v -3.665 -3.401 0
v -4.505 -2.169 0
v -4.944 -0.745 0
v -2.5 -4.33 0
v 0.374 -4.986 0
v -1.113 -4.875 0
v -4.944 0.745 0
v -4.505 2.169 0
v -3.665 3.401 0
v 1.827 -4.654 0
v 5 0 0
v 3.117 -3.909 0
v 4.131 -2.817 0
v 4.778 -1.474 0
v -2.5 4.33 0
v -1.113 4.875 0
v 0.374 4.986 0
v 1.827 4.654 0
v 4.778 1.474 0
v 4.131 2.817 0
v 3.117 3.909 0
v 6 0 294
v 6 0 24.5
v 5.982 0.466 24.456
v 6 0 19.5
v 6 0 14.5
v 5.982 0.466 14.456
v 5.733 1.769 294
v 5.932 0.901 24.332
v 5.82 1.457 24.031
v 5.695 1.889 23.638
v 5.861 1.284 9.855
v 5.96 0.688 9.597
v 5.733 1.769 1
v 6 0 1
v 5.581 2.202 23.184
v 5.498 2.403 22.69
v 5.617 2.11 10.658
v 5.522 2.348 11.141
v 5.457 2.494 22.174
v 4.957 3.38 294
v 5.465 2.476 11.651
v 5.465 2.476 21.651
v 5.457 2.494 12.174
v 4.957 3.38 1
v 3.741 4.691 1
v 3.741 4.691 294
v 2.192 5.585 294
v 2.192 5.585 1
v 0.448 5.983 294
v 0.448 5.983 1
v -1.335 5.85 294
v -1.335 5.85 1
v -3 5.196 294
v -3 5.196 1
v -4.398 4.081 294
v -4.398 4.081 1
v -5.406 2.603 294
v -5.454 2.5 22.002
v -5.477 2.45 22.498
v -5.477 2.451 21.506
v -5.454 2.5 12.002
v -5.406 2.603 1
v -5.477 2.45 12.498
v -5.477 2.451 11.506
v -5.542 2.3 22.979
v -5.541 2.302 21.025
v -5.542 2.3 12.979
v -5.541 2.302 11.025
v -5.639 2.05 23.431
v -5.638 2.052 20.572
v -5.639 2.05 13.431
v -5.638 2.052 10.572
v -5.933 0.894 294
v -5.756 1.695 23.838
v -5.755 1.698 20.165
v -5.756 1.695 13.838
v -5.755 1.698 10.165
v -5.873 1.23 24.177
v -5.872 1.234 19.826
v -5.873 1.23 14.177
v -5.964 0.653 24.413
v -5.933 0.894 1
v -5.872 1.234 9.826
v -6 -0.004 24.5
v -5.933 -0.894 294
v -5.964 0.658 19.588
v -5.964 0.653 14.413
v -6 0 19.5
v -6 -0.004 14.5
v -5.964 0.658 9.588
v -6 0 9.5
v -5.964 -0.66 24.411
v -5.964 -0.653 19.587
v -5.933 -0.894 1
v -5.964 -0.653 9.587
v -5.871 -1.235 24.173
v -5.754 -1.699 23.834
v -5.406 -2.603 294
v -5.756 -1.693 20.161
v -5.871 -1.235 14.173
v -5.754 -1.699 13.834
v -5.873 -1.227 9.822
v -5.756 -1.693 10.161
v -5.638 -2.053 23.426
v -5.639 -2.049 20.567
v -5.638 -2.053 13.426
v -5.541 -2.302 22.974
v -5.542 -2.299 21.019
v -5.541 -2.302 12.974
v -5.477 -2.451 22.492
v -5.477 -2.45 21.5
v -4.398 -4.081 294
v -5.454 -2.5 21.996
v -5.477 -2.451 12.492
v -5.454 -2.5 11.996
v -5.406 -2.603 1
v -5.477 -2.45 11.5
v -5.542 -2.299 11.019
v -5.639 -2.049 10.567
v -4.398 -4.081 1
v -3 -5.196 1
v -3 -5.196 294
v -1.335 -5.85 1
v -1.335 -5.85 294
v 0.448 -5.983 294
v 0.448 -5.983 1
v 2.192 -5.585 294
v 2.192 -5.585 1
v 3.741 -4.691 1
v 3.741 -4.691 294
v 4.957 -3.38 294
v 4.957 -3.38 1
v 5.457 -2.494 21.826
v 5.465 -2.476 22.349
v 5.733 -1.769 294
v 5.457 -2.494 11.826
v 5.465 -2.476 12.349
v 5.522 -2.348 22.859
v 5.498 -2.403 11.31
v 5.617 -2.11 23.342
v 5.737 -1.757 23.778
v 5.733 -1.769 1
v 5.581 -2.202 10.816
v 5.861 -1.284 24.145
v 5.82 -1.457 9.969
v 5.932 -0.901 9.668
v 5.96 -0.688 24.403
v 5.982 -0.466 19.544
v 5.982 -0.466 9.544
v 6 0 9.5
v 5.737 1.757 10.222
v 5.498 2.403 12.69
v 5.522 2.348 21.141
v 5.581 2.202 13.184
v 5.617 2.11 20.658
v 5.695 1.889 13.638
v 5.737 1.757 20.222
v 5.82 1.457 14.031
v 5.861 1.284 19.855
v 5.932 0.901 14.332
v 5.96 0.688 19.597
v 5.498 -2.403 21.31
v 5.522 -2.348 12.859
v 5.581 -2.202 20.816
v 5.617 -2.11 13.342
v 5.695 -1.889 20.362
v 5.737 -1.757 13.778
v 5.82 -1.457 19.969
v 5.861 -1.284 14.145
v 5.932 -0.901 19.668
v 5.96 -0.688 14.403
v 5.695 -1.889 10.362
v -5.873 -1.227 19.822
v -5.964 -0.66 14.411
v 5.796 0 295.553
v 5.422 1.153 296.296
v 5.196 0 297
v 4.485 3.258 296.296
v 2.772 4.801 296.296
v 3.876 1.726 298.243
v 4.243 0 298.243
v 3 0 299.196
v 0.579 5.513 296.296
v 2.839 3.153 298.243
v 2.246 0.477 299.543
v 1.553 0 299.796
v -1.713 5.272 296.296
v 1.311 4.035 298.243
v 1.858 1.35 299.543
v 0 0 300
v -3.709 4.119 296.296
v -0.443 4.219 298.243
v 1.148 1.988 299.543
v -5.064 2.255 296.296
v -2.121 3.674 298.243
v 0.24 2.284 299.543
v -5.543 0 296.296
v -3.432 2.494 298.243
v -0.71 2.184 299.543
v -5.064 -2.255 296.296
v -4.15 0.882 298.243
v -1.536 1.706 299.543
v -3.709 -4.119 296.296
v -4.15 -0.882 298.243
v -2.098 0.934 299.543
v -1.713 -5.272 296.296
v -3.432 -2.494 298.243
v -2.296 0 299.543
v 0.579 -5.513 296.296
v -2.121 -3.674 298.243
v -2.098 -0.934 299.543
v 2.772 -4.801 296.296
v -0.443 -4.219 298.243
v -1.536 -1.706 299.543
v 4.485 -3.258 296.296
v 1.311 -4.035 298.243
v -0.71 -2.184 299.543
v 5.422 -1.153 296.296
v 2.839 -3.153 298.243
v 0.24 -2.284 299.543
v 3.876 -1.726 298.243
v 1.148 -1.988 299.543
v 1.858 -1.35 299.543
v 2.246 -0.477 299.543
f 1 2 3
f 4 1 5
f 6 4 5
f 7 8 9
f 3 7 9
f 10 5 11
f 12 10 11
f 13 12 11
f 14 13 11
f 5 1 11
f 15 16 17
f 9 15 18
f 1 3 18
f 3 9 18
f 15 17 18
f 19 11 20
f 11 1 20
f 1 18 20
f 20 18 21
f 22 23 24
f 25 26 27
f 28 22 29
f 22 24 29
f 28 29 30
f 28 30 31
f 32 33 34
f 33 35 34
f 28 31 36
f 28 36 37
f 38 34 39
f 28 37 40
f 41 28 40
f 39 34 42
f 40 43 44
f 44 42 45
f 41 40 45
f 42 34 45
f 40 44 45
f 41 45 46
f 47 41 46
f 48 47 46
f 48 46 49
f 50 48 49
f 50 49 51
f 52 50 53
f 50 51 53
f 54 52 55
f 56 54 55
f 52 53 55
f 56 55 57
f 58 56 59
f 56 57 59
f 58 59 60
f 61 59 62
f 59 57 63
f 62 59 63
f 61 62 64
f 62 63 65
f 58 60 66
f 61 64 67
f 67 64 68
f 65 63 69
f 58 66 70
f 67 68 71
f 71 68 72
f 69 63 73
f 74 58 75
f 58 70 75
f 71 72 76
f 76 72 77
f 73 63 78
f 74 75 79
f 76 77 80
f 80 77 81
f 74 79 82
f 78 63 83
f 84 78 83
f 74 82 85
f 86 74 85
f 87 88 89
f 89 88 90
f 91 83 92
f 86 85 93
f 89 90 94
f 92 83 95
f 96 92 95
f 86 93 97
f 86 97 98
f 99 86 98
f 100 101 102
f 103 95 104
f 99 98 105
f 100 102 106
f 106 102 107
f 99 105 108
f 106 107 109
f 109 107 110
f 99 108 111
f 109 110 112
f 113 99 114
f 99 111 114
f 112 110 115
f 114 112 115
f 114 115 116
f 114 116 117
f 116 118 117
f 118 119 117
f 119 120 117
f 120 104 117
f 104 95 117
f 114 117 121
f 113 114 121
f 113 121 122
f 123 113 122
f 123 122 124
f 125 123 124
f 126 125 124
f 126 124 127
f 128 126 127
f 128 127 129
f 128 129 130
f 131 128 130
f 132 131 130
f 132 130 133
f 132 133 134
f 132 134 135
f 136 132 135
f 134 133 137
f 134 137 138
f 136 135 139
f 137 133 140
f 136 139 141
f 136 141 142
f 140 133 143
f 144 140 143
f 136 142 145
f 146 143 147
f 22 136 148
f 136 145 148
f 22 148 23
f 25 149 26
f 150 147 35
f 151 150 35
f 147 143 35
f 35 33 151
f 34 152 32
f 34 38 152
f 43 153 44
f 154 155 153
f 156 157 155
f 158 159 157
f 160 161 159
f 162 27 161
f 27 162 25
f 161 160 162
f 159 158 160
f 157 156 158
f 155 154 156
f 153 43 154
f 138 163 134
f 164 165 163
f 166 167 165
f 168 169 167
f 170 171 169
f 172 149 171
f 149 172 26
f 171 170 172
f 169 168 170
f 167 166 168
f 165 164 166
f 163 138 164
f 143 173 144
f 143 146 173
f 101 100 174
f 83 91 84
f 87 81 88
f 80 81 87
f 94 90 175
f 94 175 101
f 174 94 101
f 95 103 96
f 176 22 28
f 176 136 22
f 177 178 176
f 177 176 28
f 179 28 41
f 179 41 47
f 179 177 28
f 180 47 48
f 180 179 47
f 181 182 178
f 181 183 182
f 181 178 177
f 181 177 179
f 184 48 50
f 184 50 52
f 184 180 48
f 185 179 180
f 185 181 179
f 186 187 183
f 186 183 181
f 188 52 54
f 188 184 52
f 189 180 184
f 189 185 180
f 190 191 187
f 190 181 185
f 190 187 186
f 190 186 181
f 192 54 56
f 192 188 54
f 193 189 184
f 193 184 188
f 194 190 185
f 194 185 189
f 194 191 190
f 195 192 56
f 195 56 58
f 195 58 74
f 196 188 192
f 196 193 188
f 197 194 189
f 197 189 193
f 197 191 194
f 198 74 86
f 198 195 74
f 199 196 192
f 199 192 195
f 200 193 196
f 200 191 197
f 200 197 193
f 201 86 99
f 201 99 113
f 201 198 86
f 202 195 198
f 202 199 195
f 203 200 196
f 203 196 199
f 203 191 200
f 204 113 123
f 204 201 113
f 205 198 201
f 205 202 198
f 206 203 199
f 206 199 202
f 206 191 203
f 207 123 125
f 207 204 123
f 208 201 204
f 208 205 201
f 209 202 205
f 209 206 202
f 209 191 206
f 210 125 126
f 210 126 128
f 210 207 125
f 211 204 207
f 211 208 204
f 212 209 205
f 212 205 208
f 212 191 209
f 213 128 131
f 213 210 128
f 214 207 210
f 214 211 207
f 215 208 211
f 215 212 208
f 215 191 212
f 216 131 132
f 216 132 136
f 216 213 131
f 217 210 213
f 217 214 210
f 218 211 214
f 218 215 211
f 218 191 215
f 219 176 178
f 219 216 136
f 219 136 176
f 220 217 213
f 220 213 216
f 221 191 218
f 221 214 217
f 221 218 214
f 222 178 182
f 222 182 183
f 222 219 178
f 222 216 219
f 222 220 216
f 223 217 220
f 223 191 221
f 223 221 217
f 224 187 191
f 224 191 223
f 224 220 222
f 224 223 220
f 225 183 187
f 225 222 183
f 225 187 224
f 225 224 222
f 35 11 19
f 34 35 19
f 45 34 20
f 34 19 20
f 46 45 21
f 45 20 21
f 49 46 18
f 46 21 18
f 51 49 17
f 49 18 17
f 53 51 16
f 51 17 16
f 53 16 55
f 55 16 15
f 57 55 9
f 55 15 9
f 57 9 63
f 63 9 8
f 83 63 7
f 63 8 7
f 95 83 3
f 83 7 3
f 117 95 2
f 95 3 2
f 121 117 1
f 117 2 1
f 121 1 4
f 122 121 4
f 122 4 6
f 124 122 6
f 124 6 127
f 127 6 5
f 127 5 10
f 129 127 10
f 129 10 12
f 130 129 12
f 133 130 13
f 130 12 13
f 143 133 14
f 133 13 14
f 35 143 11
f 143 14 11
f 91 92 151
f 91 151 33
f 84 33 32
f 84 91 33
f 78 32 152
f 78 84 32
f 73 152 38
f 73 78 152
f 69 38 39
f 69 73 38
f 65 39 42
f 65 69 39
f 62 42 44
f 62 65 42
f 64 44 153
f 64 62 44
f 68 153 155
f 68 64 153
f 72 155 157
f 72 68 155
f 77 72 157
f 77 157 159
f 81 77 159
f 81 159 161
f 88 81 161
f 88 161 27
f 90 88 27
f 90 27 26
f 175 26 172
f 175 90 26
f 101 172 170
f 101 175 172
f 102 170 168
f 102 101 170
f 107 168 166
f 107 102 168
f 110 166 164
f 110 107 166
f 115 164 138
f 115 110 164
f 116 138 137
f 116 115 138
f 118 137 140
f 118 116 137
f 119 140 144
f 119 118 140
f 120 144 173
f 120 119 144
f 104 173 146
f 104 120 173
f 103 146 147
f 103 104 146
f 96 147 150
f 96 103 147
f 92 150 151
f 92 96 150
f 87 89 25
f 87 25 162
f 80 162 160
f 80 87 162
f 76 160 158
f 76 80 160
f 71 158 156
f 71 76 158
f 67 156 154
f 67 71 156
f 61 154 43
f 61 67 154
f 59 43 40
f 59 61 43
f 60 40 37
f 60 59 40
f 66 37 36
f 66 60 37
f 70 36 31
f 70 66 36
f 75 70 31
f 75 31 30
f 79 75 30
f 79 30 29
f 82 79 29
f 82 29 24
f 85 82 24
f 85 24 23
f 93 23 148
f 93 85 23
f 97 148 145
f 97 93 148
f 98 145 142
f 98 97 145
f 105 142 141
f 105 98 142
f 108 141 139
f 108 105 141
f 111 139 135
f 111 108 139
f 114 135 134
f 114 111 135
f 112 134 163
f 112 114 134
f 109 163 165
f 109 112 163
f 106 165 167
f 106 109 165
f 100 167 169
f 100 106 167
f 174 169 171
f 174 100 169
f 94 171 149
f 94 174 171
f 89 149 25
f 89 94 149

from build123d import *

# Parameters (mm, degrees)
CROQUIS1_R                 = 6
SALIENTE_EXTRUIR1_DEPTH    = 300
REDONDEO1_R                = 6
CORTAR_EXTRUIR1_DEPTH      = 301.11997601
CORTAR_EXTRUIR1_DEPTH_BACK = 301.11997601
CROQUIS2_R                 = 2.5
CHAFL_N1_SIZE              = 1


with BuildPart() as part:
    # Croquis1 → Saliente-Extruir1 (new body)
    with BuildSketch(Plane.XY):
        Circle(CROQUIS1_R)
    extrude(amount=SALIENTE_EXTRUIR1_DEPTH)

    # Redondeo1
    redondeo1_edges = [part.edges().sort_by_distance(p)[0] for p in [
        (-6, 0, 300),
    ]]
    fillet(redondeo1_edges, radius=REDONDEO1_R)

    # Croquis2 → Cortar-Extruir1 (cut, two sides: drawn at the far end of the back side and taken through both)
    with BuildSketch(Plane(origin=(0, 0, 0), x_dir=(0, 0, -1), z_dir=(1, 0, 0)).offset(-CORTAR_EXTRUIR1_DEPTH_BACK)):
        with Locations((-12, 0)):
            Circle(CROQUIS2_R)
        with Locations((-22, 0)):
            Circle(CROQUIS2_R)
    extrude(amount=CORTAR_EXTRUIR1_DEPTH + CORTAR_EXTRUIR1_DEPTH_BACK, mode=Mode.SUBTRACT)

    # Chaflán1
    chafl_n1_edges = [part.edges().sort_by_distance(p)[0] for p in [
        (-6, 0, 0),
    ]]
    chamfer(chafl_n1_edges, length=CHAFL_N1_SIZE)


solid = part.part
